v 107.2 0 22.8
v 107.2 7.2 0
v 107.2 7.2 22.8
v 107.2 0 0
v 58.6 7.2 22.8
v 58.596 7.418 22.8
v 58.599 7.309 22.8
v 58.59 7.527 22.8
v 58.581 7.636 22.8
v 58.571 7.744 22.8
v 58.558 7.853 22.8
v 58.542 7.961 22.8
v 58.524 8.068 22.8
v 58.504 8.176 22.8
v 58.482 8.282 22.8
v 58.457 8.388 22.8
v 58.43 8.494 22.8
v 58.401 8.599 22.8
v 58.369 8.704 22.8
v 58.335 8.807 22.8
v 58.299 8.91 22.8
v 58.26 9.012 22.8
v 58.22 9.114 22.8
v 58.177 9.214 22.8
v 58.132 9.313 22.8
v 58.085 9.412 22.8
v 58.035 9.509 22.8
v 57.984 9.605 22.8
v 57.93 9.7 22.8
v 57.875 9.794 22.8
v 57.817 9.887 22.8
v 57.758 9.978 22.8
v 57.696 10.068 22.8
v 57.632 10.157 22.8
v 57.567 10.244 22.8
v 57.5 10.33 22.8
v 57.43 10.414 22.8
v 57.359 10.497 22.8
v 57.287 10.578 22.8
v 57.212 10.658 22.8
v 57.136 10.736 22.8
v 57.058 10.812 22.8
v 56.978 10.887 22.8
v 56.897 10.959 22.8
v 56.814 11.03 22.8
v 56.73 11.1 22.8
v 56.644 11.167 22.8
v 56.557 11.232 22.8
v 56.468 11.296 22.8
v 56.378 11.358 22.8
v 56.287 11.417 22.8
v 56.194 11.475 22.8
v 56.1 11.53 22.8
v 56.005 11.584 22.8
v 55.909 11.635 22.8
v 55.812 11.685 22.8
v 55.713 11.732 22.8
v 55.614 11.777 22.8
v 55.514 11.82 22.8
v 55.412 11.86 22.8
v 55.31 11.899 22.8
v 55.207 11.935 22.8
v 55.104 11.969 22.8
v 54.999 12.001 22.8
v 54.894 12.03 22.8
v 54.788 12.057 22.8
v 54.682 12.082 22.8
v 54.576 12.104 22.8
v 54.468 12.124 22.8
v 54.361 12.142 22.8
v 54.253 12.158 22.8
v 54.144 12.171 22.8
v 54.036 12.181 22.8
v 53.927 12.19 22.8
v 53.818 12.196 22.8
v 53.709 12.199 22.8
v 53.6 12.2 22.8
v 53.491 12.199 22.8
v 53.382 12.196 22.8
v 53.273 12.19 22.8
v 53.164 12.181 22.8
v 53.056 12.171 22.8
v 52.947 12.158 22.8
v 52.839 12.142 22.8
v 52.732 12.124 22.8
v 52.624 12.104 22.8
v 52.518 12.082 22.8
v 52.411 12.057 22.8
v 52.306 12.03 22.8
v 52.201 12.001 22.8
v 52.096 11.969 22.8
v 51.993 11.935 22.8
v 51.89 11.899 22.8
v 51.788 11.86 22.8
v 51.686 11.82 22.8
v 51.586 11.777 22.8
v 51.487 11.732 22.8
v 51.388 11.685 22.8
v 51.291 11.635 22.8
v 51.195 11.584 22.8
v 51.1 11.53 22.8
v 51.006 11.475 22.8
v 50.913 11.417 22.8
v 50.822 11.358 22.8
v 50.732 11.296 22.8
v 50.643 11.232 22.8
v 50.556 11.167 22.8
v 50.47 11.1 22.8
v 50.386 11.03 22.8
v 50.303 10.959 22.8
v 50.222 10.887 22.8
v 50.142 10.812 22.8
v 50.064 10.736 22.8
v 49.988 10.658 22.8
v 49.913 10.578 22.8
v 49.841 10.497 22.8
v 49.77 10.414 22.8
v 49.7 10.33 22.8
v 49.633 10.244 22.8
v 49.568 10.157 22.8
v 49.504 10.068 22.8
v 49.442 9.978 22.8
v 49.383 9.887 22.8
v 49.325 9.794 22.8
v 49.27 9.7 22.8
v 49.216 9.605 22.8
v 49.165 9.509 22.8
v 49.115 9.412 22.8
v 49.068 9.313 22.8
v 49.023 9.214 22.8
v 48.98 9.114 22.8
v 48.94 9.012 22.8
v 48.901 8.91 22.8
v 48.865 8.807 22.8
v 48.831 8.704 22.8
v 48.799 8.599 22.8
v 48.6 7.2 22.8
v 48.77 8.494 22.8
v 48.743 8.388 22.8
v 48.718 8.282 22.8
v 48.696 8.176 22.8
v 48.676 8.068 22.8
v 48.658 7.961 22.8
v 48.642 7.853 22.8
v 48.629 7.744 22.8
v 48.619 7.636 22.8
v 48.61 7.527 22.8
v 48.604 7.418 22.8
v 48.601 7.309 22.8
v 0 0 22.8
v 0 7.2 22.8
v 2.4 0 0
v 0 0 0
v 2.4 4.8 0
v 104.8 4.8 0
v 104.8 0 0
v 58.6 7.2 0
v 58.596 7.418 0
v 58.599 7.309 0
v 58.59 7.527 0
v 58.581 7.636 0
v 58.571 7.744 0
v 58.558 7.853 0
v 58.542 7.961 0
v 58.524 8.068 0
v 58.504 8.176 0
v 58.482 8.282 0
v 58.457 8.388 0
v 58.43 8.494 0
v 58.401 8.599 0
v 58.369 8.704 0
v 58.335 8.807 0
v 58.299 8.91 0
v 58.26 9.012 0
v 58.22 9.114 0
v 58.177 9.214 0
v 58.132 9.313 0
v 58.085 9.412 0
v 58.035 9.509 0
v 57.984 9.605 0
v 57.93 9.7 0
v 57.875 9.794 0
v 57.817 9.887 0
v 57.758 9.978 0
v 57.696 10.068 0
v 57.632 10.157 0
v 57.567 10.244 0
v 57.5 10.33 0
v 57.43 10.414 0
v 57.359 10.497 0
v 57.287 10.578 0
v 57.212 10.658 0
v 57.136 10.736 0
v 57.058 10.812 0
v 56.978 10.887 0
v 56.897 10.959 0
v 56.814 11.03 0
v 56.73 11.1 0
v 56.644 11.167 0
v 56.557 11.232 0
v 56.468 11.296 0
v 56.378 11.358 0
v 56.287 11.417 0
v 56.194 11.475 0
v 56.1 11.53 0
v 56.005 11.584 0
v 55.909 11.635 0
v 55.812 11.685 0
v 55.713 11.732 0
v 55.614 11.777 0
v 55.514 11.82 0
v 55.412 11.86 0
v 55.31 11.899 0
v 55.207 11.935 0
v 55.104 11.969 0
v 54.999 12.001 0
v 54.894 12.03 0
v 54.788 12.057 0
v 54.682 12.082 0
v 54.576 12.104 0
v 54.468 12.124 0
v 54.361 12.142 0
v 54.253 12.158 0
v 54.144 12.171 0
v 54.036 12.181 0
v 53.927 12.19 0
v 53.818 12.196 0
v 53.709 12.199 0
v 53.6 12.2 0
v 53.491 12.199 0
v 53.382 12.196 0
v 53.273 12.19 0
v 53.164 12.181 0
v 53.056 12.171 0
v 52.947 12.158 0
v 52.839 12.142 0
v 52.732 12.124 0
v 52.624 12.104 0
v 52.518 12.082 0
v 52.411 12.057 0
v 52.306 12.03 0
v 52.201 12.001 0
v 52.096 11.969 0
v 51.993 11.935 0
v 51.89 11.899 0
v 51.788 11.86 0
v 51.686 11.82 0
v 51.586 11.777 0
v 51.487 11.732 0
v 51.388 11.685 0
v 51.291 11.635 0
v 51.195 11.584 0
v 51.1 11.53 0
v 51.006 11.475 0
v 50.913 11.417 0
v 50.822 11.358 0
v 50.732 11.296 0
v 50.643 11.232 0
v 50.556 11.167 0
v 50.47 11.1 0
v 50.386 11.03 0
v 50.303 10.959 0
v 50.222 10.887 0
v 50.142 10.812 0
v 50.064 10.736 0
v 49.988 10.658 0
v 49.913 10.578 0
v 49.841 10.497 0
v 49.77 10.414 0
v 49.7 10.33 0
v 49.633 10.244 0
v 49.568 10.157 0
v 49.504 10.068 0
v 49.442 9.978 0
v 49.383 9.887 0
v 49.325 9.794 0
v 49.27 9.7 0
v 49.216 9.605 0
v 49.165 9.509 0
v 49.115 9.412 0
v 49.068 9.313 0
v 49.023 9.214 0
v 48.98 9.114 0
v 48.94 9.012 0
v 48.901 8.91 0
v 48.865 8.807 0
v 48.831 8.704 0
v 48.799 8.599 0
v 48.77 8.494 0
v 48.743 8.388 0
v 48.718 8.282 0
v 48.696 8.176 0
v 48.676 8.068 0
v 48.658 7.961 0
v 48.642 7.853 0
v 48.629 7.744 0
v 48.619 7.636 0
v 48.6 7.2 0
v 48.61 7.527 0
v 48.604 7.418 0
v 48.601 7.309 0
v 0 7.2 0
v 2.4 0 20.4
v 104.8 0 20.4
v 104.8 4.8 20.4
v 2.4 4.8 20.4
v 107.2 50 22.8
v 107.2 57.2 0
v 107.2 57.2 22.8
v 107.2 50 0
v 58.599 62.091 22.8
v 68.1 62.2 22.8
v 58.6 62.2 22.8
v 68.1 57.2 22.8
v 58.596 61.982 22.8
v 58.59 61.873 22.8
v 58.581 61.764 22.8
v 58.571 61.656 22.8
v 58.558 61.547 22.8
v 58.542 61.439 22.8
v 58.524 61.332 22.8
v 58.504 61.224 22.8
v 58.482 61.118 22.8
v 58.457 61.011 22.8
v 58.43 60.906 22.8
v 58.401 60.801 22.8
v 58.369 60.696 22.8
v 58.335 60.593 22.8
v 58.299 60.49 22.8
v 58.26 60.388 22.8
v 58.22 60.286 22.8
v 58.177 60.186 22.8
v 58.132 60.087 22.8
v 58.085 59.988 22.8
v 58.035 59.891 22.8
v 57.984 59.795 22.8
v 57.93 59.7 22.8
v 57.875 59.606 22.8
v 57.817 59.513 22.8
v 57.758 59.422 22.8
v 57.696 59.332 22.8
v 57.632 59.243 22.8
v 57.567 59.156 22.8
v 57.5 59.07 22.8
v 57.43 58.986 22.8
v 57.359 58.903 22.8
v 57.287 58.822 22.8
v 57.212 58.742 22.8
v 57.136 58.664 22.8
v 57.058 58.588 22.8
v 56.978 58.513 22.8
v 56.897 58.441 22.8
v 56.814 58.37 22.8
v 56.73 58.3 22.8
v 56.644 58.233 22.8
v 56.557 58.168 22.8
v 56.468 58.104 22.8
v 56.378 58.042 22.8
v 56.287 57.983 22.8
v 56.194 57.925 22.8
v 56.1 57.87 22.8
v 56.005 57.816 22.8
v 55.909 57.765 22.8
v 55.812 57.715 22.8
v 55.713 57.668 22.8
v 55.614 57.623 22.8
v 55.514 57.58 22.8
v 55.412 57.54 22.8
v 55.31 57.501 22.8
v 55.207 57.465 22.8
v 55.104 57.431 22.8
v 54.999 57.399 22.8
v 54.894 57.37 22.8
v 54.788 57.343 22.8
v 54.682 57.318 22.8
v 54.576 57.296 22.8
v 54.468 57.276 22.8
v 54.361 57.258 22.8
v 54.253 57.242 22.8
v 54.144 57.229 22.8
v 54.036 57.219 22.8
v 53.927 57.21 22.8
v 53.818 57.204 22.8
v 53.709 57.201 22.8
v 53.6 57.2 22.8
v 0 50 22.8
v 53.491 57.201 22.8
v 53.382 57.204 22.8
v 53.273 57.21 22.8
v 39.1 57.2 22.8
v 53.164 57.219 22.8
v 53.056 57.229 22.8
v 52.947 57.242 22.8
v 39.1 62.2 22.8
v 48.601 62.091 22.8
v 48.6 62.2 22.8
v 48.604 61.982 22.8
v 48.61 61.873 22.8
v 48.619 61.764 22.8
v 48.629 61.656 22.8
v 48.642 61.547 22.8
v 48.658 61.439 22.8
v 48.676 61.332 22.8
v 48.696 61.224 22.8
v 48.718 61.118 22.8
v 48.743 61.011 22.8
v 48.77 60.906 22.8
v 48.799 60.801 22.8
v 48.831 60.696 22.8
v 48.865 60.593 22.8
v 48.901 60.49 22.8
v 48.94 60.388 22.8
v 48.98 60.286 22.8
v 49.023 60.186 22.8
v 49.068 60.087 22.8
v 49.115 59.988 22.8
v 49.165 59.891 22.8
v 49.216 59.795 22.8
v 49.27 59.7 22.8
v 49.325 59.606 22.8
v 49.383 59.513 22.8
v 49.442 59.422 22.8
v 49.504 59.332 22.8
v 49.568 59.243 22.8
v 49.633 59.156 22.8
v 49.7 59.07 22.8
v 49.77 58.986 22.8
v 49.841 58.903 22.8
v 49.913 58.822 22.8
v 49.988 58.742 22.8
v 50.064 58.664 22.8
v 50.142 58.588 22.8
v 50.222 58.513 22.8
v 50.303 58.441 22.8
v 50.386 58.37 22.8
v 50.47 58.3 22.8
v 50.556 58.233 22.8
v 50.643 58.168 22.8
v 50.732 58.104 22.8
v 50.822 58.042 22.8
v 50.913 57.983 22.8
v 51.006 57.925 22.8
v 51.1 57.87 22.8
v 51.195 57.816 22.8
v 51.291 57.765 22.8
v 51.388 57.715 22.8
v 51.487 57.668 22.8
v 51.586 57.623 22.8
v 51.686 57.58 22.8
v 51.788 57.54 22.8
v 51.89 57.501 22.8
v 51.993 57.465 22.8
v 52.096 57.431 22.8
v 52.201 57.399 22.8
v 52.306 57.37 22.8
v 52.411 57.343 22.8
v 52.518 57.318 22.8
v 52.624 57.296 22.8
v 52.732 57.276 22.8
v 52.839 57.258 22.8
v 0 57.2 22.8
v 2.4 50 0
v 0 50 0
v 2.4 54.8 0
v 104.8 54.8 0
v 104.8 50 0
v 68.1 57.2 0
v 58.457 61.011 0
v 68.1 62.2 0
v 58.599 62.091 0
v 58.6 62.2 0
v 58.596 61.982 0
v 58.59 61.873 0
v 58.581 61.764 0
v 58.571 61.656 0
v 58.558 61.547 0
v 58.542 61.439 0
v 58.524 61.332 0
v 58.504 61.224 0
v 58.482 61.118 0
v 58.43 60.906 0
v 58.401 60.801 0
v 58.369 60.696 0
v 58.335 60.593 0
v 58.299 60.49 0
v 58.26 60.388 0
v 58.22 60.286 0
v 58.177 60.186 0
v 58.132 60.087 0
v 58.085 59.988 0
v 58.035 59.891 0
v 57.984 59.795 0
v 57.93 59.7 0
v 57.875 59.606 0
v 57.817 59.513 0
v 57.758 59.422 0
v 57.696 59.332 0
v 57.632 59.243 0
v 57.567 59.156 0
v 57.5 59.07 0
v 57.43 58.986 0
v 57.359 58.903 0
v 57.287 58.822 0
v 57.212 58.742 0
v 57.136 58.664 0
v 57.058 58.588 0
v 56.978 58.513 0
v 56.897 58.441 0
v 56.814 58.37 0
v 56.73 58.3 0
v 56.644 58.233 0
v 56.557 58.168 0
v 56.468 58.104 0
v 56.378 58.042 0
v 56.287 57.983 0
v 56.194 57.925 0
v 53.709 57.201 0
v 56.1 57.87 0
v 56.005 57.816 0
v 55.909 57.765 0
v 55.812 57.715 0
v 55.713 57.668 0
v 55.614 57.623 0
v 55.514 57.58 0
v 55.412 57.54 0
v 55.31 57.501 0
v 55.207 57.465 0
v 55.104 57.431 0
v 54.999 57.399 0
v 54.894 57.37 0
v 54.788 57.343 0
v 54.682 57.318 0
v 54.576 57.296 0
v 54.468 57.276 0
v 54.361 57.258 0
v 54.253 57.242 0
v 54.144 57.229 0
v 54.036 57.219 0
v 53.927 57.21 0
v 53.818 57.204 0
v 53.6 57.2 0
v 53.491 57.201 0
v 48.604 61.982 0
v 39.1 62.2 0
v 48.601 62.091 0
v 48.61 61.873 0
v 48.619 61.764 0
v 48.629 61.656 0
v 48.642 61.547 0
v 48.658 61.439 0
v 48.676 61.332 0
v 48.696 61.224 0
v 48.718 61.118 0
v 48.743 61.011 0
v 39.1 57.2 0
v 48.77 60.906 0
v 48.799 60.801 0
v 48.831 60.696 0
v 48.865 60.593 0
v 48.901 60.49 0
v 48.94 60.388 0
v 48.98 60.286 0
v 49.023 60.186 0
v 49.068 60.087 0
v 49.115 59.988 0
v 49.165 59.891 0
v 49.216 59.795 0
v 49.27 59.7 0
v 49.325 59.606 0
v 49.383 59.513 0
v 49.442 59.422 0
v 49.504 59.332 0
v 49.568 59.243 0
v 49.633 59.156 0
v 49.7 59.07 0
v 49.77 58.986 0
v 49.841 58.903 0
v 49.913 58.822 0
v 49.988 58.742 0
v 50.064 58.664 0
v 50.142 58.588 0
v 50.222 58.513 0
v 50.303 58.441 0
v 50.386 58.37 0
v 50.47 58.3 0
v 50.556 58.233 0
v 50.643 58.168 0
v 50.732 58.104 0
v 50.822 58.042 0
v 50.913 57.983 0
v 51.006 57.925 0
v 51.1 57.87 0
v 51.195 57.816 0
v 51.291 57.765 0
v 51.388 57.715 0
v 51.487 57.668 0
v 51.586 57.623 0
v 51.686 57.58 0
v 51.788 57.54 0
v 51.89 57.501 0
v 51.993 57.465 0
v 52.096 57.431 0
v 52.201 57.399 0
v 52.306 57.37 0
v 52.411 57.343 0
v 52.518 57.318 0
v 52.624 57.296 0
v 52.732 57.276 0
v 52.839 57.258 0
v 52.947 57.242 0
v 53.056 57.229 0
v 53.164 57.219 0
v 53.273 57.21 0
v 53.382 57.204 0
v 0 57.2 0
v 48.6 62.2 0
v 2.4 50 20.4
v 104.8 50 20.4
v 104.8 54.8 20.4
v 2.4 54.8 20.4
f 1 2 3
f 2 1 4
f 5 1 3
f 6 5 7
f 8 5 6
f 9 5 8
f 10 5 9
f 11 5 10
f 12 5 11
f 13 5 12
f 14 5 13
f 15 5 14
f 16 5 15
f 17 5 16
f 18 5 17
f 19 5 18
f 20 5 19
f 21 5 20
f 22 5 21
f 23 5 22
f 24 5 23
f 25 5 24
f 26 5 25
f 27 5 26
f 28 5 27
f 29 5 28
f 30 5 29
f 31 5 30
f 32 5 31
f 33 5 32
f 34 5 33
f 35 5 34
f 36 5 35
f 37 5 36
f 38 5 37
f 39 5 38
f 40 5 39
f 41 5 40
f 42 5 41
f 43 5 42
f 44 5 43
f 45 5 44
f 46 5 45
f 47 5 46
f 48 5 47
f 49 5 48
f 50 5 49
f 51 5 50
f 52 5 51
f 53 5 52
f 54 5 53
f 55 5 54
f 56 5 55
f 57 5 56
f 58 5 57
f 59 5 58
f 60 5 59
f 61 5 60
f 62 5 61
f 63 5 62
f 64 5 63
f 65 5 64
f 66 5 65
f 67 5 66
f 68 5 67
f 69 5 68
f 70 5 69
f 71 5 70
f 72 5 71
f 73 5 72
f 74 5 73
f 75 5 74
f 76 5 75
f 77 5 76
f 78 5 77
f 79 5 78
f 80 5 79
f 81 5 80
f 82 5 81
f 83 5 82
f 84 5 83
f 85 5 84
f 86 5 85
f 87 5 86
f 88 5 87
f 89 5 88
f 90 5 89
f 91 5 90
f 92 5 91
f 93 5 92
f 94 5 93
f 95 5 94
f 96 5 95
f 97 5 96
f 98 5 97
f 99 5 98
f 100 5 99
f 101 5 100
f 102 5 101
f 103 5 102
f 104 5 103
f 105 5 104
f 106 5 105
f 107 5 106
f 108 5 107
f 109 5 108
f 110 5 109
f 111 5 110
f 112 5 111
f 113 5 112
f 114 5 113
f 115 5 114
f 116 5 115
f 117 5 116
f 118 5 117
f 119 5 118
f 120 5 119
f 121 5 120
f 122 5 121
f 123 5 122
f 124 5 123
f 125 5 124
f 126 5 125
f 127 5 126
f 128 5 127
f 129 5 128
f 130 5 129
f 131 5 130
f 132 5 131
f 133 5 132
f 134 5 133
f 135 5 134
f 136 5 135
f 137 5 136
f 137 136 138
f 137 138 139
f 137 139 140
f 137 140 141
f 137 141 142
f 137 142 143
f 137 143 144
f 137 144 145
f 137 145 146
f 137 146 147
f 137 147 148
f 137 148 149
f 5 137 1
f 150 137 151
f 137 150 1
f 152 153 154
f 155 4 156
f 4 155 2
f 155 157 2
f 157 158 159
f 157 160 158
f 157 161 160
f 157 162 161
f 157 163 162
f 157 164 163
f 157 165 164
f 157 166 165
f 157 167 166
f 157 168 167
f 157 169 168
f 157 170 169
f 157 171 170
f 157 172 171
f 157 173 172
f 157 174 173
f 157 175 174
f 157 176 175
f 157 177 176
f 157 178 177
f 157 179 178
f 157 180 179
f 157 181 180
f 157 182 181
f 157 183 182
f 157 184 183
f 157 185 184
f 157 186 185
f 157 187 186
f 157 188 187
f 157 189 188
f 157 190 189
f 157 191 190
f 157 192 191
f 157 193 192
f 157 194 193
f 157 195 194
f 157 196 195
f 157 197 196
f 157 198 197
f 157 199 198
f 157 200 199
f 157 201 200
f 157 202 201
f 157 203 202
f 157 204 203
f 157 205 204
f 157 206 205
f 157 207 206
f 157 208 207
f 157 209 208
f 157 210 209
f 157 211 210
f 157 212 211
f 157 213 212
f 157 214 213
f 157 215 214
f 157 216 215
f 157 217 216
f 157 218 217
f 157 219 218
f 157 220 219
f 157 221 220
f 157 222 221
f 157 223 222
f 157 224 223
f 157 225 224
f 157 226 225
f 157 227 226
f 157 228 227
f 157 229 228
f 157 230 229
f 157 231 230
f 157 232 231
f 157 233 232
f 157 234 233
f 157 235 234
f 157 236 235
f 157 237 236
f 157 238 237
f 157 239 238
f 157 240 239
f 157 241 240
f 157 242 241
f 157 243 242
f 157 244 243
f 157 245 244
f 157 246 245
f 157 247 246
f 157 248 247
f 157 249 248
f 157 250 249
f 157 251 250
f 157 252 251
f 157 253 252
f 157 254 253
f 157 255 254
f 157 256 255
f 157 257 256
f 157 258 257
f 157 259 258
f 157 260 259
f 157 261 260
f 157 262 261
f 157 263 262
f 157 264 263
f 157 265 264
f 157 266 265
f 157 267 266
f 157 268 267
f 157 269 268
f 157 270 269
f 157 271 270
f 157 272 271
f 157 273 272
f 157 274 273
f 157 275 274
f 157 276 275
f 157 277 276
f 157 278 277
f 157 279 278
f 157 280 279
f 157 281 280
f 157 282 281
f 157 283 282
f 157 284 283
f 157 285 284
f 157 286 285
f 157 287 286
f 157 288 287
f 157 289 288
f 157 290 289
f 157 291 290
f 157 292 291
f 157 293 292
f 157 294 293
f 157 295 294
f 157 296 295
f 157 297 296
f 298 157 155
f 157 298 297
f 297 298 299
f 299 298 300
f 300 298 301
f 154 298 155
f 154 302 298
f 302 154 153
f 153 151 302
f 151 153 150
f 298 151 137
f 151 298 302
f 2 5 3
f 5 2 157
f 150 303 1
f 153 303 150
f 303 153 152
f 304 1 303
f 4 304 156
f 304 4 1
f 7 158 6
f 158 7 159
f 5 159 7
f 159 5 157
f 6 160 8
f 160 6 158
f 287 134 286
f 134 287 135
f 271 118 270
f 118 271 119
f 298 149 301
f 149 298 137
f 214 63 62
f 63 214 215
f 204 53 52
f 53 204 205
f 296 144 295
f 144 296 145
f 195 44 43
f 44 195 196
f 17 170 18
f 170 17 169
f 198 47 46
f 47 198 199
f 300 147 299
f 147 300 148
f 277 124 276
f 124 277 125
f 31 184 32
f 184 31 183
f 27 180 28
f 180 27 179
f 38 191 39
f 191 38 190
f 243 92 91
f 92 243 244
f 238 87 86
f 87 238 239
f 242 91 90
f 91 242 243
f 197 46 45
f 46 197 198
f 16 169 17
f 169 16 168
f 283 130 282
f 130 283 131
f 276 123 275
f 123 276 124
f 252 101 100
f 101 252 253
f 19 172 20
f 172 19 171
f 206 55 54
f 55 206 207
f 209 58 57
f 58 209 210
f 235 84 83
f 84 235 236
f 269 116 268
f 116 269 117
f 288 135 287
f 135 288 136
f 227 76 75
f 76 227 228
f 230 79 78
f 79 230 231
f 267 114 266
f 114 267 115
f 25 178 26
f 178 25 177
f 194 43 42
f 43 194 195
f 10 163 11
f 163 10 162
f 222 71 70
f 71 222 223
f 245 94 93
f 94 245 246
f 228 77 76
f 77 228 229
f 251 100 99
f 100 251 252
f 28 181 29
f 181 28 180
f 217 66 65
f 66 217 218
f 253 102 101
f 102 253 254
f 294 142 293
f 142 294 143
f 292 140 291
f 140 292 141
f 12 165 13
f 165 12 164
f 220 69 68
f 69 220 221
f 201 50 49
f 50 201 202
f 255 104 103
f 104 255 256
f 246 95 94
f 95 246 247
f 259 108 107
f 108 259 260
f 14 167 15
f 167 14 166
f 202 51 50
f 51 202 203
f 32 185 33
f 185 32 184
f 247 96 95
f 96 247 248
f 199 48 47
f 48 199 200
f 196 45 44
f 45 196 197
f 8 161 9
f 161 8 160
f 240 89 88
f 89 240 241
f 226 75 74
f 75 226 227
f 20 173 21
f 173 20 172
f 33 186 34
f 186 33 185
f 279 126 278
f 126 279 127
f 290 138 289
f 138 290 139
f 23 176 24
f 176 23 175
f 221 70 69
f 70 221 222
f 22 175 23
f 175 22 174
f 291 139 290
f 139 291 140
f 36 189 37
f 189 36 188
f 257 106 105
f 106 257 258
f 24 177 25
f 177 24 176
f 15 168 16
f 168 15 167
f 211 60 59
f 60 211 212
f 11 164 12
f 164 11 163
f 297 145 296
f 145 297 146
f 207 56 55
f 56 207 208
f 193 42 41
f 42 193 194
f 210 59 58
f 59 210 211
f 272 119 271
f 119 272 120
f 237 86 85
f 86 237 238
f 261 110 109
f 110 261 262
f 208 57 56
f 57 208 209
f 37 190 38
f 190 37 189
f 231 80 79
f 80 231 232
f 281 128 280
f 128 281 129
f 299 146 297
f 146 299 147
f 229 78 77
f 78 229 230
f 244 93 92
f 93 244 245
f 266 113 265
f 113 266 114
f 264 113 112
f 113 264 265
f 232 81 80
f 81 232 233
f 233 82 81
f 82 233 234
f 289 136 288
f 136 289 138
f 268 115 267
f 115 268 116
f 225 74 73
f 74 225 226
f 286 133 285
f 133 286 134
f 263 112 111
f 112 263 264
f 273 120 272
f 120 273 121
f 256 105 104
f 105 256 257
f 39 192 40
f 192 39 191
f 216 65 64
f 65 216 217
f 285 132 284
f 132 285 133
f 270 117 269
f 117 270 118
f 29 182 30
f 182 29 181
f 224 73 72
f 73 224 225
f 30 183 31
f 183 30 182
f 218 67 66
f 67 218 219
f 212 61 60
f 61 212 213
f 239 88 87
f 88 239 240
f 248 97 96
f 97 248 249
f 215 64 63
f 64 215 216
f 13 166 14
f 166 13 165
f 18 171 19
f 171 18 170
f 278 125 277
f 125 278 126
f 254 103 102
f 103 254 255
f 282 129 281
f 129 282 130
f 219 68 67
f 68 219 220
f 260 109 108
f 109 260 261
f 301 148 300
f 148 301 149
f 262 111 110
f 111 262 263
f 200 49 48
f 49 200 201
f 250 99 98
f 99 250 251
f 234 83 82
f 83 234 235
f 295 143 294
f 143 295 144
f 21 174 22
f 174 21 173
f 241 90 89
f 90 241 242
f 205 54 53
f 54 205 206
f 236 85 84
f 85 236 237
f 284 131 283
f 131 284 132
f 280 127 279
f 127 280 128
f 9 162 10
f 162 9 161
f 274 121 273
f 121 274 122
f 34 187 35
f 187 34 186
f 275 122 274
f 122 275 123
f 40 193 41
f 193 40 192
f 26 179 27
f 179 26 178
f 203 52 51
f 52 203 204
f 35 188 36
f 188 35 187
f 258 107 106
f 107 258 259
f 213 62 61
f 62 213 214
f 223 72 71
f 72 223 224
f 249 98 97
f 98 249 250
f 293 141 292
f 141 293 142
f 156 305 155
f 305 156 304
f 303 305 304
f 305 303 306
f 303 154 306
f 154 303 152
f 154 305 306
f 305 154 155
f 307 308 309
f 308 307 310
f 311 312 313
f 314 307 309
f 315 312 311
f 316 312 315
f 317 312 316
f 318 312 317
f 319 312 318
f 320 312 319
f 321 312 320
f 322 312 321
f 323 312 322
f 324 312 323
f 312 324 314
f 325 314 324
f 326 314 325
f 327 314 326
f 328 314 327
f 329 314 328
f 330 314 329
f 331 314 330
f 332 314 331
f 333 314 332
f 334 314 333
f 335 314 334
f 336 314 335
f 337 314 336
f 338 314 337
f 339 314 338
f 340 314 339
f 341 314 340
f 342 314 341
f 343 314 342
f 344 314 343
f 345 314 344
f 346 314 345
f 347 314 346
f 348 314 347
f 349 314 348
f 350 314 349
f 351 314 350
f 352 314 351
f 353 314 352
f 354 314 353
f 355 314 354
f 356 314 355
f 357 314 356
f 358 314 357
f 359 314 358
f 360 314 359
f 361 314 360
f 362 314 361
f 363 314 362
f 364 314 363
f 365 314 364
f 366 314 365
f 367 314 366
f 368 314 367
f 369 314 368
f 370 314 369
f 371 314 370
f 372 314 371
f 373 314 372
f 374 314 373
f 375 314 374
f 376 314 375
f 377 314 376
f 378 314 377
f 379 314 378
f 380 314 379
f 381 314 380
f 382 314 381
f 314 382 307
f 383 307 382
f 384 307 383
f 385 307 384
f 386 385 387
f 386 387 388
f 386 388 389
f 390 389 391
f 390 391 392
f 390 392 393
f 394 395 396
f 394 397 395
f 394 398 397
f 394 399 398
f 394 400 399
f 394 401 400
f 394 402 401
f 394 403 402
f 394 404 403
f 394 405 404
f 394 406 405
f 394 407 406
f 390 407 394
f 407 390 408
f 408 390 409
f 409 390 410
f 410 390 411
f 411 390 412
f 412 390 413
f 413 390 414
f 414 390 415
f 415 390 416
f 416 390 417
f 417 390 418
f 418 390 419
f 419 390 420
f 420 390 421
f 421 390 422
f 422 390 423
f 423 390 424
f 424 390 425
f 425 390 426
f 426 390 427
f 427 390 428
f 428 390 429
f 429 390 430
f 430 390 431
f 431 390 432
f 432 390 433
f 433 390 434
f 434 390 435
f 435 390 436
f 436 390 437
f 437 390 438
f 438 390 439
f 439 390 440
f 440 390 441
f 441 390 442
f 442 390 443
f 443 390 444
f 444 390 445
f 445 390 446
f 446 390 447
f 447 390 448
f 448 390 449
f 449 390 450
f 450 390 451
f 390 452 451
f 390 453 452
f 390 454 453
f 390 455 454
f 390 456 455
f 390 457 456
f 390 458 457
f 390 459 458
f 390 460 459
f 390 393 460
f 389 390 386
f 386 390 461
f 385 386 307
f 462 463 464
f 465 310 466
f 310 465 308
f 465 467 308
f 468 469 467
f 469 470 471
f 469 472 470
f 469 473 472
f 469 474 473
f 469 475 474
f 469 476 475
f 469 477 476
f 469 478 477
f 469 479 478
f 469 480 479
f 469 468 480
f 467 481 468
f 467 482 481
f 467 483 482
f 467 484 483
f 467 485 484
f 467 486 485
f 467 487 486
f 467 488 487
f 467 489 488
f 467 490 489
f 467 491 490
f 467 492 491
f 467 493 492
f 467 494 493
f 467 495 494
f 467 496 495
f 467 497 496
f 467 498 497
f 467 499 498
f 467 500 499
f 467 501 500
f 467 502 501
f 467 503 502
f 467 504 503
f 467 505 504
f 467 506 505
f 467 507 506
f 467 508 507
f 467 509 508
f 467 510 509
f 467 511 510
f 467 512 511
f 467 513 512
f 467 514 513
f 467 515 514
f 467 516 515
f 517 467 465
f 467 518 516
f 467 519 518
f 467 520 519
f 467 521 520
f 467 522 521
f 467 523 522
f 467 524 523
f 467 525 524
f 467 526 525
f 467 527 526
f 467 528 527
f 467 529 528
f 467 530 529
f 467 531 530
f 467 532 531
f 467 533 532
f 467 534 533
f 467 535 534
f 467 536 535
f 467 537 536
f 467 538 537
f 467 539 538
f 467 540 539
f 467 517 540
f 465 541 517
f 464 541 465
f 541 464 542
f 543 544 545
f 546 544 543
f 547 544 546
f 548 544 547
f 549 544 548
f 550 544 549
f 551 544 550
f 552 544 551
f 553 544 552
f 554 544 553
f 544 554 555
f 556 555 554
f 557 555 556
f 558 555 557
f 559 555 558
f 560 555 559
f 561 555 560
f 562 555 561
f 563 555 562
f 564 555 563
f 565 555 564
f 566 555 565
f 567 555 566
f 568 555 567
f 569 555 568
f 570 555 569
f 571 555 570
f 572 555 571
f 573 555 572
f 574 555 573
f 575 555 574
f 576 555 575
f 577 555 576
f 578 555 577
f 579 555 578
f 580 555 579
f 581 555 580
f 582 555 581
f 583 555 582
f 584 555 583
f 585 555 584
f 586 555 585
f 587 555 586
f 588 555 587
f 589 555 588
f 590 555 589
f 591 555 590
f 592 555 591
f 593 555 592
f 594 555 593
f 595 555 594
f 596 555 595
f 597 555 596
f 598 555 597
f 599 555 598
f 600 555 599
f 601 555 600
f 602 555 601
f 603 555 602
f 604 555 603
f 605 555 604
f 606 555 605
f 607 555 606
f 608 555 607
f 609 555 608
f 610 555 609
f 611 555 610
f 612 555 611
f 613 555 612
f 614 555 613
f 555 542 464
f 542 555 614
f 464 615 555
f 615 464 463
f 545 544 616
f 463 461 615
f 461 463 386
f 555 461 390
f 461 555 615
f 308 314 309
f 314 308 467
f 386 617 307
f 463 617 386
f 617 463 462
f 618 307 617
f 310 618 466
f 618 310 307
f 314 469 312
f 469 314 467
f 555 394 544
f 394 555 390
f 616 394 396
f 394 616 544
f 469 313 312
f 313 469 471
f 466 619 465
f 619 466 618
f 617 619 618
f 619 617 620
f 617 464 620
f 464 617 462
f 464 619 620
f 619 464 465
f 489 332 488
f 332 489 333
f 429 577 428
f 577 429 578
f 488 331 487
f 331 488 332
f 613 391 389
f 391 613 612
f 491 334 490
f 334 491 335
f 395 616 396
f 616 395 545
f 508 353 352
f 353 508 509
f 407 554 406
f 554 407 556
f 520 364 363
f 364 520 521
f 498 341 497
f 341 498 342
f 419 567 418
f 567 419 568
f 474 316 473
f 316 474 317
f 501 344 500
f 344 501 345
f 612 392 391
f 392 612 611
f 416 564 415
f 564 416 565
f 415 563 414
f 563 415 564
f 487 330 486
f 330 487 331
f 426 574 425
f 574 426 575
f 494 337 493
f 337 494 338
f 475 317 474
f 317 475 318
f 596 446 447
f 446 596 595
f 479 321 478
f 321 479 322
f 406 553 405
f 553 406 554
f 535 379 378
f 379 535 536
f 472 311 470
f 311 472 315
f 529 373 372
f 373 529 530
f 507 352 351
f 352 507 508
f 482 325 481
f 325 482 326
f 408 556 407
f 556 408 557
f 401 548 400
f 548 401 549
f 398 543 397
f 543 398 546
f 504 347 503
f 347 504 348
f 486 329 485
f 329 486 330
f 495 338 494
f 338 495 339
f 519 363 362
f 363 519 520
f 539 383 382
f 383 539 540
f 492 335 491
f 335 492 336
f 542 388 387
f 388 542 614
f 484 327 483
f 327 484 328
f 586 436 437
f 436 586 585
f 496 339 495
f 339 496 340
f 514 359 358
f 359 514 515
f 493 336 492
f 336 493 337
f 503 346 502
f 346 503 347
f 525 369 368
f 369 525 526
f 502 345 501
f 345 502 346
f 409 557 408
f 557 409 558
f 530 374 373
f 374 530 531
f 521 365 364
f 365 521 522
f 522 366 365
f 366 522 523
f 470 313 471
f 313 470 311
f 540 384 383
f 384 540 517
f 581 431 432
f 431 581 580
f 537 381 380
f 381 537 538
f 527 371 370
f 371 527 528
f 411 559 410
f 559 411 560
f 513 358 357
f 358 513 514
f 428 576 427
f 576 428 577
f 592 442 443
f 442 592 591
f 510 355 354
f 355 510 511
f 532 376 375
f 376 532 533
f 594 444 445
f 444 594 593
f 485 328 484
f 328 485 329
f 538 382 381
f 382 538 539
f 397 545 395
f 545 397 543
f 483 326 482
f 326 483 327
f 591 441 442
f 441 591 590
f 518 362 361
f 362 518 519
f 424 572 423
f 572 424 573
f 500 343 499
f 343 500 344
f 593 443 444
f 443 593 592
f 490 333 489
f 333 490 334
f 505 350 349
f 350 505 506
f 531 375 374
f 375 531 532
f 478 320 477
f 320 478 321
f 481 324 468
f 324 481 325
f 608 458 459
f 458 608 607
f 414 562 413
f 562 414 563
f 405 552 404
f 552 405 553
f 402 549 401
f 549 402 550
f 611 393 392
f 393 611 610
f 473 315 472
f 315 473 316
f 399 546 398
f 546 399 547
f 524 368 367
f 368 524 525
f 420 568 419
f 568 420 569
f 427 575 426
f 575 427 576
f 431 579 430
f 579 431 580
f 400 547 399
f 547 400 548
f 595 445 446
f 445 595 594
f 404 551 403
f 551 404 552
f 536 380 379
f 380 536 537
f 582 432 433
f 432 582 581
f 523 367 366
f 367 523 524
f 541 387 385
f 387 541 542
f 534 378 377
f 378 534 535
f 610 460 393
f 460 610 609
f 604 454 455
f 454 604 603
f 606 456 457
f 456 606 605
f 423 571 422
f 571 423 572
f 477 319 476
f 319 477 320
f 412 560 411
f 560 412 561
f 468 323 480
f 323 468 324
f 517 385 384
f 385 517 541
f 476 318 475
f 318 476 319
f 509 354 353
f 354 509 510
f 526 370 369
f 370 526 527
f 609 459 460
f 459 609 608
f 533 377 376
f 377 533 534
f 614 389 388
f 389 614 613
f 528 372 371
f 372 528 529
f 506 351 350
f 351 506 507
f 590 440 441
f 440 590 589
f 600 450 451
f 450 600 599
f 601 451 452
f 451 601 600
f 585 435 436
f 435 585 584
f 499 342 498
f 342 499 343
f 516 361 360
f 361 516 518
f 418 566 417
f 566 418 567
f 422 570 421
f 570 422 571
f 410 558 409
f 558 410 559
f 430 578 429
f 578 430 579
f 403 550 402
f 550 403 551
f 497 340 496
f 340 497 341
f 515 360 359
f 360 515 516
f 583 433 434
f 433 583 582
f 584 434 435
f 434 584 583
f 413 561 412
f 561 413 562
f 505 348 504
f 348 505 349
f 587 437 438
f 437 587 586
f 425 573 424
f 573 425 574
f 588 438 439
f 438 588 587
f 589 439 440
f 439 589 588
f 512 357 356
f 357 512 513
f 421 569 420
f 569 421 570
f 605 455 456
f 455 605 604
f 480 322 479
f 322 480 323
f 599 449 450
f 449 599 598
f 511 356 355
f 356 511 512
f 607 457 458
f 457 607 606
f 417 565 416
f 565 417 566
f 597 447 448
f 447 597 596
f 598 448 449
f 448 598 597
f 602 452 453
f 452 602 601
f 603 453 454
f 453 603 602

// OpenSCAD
// file: helpers.scad
include <MCAD/nuts_and_bolts.scad>

fn=72*4;
$fn=fn;
clearance_tight=0.2;
clearance_loose=0.4;
2clearance_loose=2*clearance_loose;

de_minimis=0.01;
2de_minimis=2*de_minimis;
min_thickness=2.4;
2min_thickness=2*min_thickness;

module cylinder_outer(height,radius,fn=fn) {
    fudge = 1/cos(180/fn);
    cylinder(h=height,r=radius*fudge,$fn=fn);
}

module circle_outer(radius,fn=fn){
    fudge = 1/cos(180/fn);
    circle(r=radius*fudge,$fn=fn);
}

module cone_outer(height,radius1,radius2,fn=fn){
   fudge = 1/cos(180/fn);
   cylinder(h=height,r1=radius1*fudge,r2=radius2*fudge,$fn=fn);
}

module doughnut(height, outer_radius, inner_radius, fn=fn) {
    difference() {
        cylinder_outer(height, outer_radius, fn);
        translate([0,0,-de_minimis]) cylinder_outer(height + (de_minimis*2), inner_radius, fn);
    }
}

module BoltHole(
    diameter,
    length,
    extra_cap_length = 0,
    user_cap_dia = 0,
    tolerance = +0.0001,
    proj = -1
)
{
	radius = COARSE_THREAD_METRIC_BOLT_MAJOR_DIAMETERS[diameter]/2+tolerance;
	capHeight = diameter+tolerance + extra_cap_length;
	capRadius = max(METRIC_BOLT_CAP_DIAMETERS[diameter]/2+tolerance, user_cap_dia / 2);

	if (proj == -1)
	{
	translate([0, 0, -capHeight])
		cylinder(r= capRadius, h=capHeight);
	cylinder(r = radius, h = length);
	}
	if (proj == 1)
	{
		circle(r = radius);
	}
	if (proj == 2)
	{
		translate([-capRadius/2, -capHeight])
			square([capRadius*2, capHeight]);
		square([radius*2, length]);
	}
}

module NutHoleAssembly(
    diameter=5,
    length=20,
    nut_depth=2.4,
    nut_mult=1,
    bolt_head_len=0,
    de_minimis=0.01
) {
    cylinder_outer(length, diameter / 2 + clearance_loose);
    nut_thickness=METRIC_NUT_THICKNESS[diameter];
    nut_total_height=nut_thickness * nut_mult;
    leading_height=length - nut_depth - nut_total_height;

    translate([
        0,
        0,
        nut_depth
    ]) scale([1, 1, nut_mult]) nutHole(diameter);

    translate([
        0,
        0,
        nut_depth + nut_total_height - de_minimis
    ]) {
        cylinder_outer(leading_height, (METRIC_NUT_AC_WIDTHS[diameter] / 2) + clearance_loose);    
    }
    
    if (bolt_head_len > 0) {
        bolt_head_dia = METRIC_BOLT_CAP_DIAMETERS[diameter] + clearance_loose * 2;
        translate([0,0,-bolt_head_len]) cylinder_outer(bolt_head_len, bolt_head_dia / 2);
    }
}

//Based on: http://www.roymech.co.uk/Useful_Tables/Screws/Hex_Screws.htm
METRIC_NUT_AF_MAX_WIDTHS =
[
	-1, //0 index is not used but reduces computation
	-1,
	-1,//m2  NO LONGER ON TABLE?
	5.5,//m3
	7.0,//m4
	8.0,//m5
	10.0,//m6
	-1,
	13.00,//m8
	-1,
	17.00,//m10
	-1,
	19.00,//m12
	-1,
	-1,
	-1,
	24.00,//m16
	-1,
	-1,
	-1,
	30.00,//m20
	-1,
	-1,
	-1,
	36.00,//m24
	-1,
	-1,
	-1,
	-1,
	-1,
	46.00,//m30
	-1,
	-1,
	-1,
	-1,
	-1,
	55.00//m36
];

module NutSlotAssembly(
    diameter=5,
    nut_depth=2.4,
    nut_height=0,
    clearance=clearance_tight * -0.5,
    clearance_slot_height=clearance_tight,
    length_behind_slot=0
) {
    nut_ac_width=METRIC_NUT_AC_WIDTHS[diameter] + 2 * clearance;
    nut_af_width=METRIC_NUT_AF_MAX_WIDTHS[diameter] + 2 * clearance;
    actual_nut_height=nut_height > 0 ? nut_height + 2 * clearance_slot_height : METRIC_NUT_THICKNESS[diameter] + 2 * clearance_slot_height;
    hole_len=nut_depth+actual_nut_height+length_behind_slot;
    cylinder_outer(hole_len, diameter / 2 + clearance_loose);

    translate([
        -nut_ac_width / 2,
        -nut_af_width / 2,
        nut_depth
    ]) cube([100, nut_af_width, actual_nut_height]);
}

module Handle(
    OUTDENT_COUNT=24,
    HANDLE_OUTDENT_RADIUS=4,
    WHEEL_RADIUS=50,
    HANDLE_THICKNESS=6,
    fn=64,
) {
    // handle
    translate([0,0,HANDLE_THICKNESS/2]) torus2(WHEEL_RADIUS, HANDLE_THICKNESS/2);
    // outdents
    outdent_degrees = 360 / OUTDENT_COUNT;
    for(sector = [1 : OUTDENT_COUNT]) {
        angle = outdent_degrees * sector;
        x_pos = WHEEL_RADIUS * sin(angle);
        y_pos = WHEEL_RADIUS * cos(angle);
        translate([x_pos,y_pos,HANDLE_OUTDENT_RADIUS]){
            sphere(HANDLE_OUTDENT_RADIUS, $fn=fn);
        }
    }
}

module CounterSunkScrew(screw_dia, screw_len, csc_len, csc_head_dia, screw_z_offset=de_minimis) {
    actual_screw_dia=screw_dia + (clearance_tight * 2);
    actual_csc_head_dia = csc_head_dia + (clearance_tight * 2);
    translate([
        0,
        0,
        -screw_len + screw_z_offset
    ]) {
        cylinder_outer(screw_len, actual_screw_dia / 2);
        translate([0, 0, screw_len]) cone_outer(csc_len, actual_screw_dia / 2, actual_csc_head_dia /2);
        translate([0, 0, screw_len + csc_len]) cylinder_outer(screw_len * 2, actual_csc_head_dia / 2);;
    }
}


module multiHull(){
    for (i = [1 : $children-1]) {
        hull(){
            children(0);
            children(i);
        }
    }
}

module sequentialHull(){
    for (i = [0: $children-2]) {
        hull() {
            children(i);
            children(i+1);
        }
    }
}
// file: shared.scad
// modules and vars specific to this project
use <MCAD/boxes.scad>
use <MCAD/nuts_and_bolts.scad>
use <MCAD/regular_shapes.scad>
// provides `inch` and other useful stuff
include <MCAD/units.scad>
include <helpers.scad>
// main file
include <shared.scad>

vise_x=4 * inch;

die_z=20;
ring_dia=8;
space_dia=ring_dia + 2;
space_rad=space_dia/2;

thickness=min_thickness;

dim_outer_vise=[
    vise_x + 2clearance_loose + 2 * thickness,
    3 * thickness,
    die_z + clearance_loose + thickness
];

dim_inner_vise=[
    vise_x + 2clearance_loose,
    2 * thickness,
    die_z + clearance_loose
];

dim_area_around_vise_insert=[
    12 + 12 + space_rad,
    space_rad,
    dim_outer_vise.z
];

module PartA () {
    difference() {
        union() {
            cube(dim_outer_vise);
            translate([
                dim_outer_vise.x / 2,
                dim_outer_vise.y,
                0
            ]) cylinder_outer(dim_outer_vise.z, space_rad);
        };
        translate([thickness,0,0]) cube(dim_inner_vise);
    };
}

module PartB () {
    difference() {
        union() {
            cube(dim_outer_vise);
            translate([
                dim_outer_vise.x / 2 - dim_area_around_vise_insert.x / 2,
                dim_outer_vise.y,
                0
            ]) cube(dim_area_around_vise_insert);
        };
        translate([thickness,0,0]) cube(dim_inner_vise);
        translate([
            dim_outer_vise.x / 2,
            dim_outer_vise.y + space_rad,
            0
        ]) cylinder_outer(dim_outer_vise.z, space_rad);
    };
}


PartA();

translate([0,50,0]) PartB();
